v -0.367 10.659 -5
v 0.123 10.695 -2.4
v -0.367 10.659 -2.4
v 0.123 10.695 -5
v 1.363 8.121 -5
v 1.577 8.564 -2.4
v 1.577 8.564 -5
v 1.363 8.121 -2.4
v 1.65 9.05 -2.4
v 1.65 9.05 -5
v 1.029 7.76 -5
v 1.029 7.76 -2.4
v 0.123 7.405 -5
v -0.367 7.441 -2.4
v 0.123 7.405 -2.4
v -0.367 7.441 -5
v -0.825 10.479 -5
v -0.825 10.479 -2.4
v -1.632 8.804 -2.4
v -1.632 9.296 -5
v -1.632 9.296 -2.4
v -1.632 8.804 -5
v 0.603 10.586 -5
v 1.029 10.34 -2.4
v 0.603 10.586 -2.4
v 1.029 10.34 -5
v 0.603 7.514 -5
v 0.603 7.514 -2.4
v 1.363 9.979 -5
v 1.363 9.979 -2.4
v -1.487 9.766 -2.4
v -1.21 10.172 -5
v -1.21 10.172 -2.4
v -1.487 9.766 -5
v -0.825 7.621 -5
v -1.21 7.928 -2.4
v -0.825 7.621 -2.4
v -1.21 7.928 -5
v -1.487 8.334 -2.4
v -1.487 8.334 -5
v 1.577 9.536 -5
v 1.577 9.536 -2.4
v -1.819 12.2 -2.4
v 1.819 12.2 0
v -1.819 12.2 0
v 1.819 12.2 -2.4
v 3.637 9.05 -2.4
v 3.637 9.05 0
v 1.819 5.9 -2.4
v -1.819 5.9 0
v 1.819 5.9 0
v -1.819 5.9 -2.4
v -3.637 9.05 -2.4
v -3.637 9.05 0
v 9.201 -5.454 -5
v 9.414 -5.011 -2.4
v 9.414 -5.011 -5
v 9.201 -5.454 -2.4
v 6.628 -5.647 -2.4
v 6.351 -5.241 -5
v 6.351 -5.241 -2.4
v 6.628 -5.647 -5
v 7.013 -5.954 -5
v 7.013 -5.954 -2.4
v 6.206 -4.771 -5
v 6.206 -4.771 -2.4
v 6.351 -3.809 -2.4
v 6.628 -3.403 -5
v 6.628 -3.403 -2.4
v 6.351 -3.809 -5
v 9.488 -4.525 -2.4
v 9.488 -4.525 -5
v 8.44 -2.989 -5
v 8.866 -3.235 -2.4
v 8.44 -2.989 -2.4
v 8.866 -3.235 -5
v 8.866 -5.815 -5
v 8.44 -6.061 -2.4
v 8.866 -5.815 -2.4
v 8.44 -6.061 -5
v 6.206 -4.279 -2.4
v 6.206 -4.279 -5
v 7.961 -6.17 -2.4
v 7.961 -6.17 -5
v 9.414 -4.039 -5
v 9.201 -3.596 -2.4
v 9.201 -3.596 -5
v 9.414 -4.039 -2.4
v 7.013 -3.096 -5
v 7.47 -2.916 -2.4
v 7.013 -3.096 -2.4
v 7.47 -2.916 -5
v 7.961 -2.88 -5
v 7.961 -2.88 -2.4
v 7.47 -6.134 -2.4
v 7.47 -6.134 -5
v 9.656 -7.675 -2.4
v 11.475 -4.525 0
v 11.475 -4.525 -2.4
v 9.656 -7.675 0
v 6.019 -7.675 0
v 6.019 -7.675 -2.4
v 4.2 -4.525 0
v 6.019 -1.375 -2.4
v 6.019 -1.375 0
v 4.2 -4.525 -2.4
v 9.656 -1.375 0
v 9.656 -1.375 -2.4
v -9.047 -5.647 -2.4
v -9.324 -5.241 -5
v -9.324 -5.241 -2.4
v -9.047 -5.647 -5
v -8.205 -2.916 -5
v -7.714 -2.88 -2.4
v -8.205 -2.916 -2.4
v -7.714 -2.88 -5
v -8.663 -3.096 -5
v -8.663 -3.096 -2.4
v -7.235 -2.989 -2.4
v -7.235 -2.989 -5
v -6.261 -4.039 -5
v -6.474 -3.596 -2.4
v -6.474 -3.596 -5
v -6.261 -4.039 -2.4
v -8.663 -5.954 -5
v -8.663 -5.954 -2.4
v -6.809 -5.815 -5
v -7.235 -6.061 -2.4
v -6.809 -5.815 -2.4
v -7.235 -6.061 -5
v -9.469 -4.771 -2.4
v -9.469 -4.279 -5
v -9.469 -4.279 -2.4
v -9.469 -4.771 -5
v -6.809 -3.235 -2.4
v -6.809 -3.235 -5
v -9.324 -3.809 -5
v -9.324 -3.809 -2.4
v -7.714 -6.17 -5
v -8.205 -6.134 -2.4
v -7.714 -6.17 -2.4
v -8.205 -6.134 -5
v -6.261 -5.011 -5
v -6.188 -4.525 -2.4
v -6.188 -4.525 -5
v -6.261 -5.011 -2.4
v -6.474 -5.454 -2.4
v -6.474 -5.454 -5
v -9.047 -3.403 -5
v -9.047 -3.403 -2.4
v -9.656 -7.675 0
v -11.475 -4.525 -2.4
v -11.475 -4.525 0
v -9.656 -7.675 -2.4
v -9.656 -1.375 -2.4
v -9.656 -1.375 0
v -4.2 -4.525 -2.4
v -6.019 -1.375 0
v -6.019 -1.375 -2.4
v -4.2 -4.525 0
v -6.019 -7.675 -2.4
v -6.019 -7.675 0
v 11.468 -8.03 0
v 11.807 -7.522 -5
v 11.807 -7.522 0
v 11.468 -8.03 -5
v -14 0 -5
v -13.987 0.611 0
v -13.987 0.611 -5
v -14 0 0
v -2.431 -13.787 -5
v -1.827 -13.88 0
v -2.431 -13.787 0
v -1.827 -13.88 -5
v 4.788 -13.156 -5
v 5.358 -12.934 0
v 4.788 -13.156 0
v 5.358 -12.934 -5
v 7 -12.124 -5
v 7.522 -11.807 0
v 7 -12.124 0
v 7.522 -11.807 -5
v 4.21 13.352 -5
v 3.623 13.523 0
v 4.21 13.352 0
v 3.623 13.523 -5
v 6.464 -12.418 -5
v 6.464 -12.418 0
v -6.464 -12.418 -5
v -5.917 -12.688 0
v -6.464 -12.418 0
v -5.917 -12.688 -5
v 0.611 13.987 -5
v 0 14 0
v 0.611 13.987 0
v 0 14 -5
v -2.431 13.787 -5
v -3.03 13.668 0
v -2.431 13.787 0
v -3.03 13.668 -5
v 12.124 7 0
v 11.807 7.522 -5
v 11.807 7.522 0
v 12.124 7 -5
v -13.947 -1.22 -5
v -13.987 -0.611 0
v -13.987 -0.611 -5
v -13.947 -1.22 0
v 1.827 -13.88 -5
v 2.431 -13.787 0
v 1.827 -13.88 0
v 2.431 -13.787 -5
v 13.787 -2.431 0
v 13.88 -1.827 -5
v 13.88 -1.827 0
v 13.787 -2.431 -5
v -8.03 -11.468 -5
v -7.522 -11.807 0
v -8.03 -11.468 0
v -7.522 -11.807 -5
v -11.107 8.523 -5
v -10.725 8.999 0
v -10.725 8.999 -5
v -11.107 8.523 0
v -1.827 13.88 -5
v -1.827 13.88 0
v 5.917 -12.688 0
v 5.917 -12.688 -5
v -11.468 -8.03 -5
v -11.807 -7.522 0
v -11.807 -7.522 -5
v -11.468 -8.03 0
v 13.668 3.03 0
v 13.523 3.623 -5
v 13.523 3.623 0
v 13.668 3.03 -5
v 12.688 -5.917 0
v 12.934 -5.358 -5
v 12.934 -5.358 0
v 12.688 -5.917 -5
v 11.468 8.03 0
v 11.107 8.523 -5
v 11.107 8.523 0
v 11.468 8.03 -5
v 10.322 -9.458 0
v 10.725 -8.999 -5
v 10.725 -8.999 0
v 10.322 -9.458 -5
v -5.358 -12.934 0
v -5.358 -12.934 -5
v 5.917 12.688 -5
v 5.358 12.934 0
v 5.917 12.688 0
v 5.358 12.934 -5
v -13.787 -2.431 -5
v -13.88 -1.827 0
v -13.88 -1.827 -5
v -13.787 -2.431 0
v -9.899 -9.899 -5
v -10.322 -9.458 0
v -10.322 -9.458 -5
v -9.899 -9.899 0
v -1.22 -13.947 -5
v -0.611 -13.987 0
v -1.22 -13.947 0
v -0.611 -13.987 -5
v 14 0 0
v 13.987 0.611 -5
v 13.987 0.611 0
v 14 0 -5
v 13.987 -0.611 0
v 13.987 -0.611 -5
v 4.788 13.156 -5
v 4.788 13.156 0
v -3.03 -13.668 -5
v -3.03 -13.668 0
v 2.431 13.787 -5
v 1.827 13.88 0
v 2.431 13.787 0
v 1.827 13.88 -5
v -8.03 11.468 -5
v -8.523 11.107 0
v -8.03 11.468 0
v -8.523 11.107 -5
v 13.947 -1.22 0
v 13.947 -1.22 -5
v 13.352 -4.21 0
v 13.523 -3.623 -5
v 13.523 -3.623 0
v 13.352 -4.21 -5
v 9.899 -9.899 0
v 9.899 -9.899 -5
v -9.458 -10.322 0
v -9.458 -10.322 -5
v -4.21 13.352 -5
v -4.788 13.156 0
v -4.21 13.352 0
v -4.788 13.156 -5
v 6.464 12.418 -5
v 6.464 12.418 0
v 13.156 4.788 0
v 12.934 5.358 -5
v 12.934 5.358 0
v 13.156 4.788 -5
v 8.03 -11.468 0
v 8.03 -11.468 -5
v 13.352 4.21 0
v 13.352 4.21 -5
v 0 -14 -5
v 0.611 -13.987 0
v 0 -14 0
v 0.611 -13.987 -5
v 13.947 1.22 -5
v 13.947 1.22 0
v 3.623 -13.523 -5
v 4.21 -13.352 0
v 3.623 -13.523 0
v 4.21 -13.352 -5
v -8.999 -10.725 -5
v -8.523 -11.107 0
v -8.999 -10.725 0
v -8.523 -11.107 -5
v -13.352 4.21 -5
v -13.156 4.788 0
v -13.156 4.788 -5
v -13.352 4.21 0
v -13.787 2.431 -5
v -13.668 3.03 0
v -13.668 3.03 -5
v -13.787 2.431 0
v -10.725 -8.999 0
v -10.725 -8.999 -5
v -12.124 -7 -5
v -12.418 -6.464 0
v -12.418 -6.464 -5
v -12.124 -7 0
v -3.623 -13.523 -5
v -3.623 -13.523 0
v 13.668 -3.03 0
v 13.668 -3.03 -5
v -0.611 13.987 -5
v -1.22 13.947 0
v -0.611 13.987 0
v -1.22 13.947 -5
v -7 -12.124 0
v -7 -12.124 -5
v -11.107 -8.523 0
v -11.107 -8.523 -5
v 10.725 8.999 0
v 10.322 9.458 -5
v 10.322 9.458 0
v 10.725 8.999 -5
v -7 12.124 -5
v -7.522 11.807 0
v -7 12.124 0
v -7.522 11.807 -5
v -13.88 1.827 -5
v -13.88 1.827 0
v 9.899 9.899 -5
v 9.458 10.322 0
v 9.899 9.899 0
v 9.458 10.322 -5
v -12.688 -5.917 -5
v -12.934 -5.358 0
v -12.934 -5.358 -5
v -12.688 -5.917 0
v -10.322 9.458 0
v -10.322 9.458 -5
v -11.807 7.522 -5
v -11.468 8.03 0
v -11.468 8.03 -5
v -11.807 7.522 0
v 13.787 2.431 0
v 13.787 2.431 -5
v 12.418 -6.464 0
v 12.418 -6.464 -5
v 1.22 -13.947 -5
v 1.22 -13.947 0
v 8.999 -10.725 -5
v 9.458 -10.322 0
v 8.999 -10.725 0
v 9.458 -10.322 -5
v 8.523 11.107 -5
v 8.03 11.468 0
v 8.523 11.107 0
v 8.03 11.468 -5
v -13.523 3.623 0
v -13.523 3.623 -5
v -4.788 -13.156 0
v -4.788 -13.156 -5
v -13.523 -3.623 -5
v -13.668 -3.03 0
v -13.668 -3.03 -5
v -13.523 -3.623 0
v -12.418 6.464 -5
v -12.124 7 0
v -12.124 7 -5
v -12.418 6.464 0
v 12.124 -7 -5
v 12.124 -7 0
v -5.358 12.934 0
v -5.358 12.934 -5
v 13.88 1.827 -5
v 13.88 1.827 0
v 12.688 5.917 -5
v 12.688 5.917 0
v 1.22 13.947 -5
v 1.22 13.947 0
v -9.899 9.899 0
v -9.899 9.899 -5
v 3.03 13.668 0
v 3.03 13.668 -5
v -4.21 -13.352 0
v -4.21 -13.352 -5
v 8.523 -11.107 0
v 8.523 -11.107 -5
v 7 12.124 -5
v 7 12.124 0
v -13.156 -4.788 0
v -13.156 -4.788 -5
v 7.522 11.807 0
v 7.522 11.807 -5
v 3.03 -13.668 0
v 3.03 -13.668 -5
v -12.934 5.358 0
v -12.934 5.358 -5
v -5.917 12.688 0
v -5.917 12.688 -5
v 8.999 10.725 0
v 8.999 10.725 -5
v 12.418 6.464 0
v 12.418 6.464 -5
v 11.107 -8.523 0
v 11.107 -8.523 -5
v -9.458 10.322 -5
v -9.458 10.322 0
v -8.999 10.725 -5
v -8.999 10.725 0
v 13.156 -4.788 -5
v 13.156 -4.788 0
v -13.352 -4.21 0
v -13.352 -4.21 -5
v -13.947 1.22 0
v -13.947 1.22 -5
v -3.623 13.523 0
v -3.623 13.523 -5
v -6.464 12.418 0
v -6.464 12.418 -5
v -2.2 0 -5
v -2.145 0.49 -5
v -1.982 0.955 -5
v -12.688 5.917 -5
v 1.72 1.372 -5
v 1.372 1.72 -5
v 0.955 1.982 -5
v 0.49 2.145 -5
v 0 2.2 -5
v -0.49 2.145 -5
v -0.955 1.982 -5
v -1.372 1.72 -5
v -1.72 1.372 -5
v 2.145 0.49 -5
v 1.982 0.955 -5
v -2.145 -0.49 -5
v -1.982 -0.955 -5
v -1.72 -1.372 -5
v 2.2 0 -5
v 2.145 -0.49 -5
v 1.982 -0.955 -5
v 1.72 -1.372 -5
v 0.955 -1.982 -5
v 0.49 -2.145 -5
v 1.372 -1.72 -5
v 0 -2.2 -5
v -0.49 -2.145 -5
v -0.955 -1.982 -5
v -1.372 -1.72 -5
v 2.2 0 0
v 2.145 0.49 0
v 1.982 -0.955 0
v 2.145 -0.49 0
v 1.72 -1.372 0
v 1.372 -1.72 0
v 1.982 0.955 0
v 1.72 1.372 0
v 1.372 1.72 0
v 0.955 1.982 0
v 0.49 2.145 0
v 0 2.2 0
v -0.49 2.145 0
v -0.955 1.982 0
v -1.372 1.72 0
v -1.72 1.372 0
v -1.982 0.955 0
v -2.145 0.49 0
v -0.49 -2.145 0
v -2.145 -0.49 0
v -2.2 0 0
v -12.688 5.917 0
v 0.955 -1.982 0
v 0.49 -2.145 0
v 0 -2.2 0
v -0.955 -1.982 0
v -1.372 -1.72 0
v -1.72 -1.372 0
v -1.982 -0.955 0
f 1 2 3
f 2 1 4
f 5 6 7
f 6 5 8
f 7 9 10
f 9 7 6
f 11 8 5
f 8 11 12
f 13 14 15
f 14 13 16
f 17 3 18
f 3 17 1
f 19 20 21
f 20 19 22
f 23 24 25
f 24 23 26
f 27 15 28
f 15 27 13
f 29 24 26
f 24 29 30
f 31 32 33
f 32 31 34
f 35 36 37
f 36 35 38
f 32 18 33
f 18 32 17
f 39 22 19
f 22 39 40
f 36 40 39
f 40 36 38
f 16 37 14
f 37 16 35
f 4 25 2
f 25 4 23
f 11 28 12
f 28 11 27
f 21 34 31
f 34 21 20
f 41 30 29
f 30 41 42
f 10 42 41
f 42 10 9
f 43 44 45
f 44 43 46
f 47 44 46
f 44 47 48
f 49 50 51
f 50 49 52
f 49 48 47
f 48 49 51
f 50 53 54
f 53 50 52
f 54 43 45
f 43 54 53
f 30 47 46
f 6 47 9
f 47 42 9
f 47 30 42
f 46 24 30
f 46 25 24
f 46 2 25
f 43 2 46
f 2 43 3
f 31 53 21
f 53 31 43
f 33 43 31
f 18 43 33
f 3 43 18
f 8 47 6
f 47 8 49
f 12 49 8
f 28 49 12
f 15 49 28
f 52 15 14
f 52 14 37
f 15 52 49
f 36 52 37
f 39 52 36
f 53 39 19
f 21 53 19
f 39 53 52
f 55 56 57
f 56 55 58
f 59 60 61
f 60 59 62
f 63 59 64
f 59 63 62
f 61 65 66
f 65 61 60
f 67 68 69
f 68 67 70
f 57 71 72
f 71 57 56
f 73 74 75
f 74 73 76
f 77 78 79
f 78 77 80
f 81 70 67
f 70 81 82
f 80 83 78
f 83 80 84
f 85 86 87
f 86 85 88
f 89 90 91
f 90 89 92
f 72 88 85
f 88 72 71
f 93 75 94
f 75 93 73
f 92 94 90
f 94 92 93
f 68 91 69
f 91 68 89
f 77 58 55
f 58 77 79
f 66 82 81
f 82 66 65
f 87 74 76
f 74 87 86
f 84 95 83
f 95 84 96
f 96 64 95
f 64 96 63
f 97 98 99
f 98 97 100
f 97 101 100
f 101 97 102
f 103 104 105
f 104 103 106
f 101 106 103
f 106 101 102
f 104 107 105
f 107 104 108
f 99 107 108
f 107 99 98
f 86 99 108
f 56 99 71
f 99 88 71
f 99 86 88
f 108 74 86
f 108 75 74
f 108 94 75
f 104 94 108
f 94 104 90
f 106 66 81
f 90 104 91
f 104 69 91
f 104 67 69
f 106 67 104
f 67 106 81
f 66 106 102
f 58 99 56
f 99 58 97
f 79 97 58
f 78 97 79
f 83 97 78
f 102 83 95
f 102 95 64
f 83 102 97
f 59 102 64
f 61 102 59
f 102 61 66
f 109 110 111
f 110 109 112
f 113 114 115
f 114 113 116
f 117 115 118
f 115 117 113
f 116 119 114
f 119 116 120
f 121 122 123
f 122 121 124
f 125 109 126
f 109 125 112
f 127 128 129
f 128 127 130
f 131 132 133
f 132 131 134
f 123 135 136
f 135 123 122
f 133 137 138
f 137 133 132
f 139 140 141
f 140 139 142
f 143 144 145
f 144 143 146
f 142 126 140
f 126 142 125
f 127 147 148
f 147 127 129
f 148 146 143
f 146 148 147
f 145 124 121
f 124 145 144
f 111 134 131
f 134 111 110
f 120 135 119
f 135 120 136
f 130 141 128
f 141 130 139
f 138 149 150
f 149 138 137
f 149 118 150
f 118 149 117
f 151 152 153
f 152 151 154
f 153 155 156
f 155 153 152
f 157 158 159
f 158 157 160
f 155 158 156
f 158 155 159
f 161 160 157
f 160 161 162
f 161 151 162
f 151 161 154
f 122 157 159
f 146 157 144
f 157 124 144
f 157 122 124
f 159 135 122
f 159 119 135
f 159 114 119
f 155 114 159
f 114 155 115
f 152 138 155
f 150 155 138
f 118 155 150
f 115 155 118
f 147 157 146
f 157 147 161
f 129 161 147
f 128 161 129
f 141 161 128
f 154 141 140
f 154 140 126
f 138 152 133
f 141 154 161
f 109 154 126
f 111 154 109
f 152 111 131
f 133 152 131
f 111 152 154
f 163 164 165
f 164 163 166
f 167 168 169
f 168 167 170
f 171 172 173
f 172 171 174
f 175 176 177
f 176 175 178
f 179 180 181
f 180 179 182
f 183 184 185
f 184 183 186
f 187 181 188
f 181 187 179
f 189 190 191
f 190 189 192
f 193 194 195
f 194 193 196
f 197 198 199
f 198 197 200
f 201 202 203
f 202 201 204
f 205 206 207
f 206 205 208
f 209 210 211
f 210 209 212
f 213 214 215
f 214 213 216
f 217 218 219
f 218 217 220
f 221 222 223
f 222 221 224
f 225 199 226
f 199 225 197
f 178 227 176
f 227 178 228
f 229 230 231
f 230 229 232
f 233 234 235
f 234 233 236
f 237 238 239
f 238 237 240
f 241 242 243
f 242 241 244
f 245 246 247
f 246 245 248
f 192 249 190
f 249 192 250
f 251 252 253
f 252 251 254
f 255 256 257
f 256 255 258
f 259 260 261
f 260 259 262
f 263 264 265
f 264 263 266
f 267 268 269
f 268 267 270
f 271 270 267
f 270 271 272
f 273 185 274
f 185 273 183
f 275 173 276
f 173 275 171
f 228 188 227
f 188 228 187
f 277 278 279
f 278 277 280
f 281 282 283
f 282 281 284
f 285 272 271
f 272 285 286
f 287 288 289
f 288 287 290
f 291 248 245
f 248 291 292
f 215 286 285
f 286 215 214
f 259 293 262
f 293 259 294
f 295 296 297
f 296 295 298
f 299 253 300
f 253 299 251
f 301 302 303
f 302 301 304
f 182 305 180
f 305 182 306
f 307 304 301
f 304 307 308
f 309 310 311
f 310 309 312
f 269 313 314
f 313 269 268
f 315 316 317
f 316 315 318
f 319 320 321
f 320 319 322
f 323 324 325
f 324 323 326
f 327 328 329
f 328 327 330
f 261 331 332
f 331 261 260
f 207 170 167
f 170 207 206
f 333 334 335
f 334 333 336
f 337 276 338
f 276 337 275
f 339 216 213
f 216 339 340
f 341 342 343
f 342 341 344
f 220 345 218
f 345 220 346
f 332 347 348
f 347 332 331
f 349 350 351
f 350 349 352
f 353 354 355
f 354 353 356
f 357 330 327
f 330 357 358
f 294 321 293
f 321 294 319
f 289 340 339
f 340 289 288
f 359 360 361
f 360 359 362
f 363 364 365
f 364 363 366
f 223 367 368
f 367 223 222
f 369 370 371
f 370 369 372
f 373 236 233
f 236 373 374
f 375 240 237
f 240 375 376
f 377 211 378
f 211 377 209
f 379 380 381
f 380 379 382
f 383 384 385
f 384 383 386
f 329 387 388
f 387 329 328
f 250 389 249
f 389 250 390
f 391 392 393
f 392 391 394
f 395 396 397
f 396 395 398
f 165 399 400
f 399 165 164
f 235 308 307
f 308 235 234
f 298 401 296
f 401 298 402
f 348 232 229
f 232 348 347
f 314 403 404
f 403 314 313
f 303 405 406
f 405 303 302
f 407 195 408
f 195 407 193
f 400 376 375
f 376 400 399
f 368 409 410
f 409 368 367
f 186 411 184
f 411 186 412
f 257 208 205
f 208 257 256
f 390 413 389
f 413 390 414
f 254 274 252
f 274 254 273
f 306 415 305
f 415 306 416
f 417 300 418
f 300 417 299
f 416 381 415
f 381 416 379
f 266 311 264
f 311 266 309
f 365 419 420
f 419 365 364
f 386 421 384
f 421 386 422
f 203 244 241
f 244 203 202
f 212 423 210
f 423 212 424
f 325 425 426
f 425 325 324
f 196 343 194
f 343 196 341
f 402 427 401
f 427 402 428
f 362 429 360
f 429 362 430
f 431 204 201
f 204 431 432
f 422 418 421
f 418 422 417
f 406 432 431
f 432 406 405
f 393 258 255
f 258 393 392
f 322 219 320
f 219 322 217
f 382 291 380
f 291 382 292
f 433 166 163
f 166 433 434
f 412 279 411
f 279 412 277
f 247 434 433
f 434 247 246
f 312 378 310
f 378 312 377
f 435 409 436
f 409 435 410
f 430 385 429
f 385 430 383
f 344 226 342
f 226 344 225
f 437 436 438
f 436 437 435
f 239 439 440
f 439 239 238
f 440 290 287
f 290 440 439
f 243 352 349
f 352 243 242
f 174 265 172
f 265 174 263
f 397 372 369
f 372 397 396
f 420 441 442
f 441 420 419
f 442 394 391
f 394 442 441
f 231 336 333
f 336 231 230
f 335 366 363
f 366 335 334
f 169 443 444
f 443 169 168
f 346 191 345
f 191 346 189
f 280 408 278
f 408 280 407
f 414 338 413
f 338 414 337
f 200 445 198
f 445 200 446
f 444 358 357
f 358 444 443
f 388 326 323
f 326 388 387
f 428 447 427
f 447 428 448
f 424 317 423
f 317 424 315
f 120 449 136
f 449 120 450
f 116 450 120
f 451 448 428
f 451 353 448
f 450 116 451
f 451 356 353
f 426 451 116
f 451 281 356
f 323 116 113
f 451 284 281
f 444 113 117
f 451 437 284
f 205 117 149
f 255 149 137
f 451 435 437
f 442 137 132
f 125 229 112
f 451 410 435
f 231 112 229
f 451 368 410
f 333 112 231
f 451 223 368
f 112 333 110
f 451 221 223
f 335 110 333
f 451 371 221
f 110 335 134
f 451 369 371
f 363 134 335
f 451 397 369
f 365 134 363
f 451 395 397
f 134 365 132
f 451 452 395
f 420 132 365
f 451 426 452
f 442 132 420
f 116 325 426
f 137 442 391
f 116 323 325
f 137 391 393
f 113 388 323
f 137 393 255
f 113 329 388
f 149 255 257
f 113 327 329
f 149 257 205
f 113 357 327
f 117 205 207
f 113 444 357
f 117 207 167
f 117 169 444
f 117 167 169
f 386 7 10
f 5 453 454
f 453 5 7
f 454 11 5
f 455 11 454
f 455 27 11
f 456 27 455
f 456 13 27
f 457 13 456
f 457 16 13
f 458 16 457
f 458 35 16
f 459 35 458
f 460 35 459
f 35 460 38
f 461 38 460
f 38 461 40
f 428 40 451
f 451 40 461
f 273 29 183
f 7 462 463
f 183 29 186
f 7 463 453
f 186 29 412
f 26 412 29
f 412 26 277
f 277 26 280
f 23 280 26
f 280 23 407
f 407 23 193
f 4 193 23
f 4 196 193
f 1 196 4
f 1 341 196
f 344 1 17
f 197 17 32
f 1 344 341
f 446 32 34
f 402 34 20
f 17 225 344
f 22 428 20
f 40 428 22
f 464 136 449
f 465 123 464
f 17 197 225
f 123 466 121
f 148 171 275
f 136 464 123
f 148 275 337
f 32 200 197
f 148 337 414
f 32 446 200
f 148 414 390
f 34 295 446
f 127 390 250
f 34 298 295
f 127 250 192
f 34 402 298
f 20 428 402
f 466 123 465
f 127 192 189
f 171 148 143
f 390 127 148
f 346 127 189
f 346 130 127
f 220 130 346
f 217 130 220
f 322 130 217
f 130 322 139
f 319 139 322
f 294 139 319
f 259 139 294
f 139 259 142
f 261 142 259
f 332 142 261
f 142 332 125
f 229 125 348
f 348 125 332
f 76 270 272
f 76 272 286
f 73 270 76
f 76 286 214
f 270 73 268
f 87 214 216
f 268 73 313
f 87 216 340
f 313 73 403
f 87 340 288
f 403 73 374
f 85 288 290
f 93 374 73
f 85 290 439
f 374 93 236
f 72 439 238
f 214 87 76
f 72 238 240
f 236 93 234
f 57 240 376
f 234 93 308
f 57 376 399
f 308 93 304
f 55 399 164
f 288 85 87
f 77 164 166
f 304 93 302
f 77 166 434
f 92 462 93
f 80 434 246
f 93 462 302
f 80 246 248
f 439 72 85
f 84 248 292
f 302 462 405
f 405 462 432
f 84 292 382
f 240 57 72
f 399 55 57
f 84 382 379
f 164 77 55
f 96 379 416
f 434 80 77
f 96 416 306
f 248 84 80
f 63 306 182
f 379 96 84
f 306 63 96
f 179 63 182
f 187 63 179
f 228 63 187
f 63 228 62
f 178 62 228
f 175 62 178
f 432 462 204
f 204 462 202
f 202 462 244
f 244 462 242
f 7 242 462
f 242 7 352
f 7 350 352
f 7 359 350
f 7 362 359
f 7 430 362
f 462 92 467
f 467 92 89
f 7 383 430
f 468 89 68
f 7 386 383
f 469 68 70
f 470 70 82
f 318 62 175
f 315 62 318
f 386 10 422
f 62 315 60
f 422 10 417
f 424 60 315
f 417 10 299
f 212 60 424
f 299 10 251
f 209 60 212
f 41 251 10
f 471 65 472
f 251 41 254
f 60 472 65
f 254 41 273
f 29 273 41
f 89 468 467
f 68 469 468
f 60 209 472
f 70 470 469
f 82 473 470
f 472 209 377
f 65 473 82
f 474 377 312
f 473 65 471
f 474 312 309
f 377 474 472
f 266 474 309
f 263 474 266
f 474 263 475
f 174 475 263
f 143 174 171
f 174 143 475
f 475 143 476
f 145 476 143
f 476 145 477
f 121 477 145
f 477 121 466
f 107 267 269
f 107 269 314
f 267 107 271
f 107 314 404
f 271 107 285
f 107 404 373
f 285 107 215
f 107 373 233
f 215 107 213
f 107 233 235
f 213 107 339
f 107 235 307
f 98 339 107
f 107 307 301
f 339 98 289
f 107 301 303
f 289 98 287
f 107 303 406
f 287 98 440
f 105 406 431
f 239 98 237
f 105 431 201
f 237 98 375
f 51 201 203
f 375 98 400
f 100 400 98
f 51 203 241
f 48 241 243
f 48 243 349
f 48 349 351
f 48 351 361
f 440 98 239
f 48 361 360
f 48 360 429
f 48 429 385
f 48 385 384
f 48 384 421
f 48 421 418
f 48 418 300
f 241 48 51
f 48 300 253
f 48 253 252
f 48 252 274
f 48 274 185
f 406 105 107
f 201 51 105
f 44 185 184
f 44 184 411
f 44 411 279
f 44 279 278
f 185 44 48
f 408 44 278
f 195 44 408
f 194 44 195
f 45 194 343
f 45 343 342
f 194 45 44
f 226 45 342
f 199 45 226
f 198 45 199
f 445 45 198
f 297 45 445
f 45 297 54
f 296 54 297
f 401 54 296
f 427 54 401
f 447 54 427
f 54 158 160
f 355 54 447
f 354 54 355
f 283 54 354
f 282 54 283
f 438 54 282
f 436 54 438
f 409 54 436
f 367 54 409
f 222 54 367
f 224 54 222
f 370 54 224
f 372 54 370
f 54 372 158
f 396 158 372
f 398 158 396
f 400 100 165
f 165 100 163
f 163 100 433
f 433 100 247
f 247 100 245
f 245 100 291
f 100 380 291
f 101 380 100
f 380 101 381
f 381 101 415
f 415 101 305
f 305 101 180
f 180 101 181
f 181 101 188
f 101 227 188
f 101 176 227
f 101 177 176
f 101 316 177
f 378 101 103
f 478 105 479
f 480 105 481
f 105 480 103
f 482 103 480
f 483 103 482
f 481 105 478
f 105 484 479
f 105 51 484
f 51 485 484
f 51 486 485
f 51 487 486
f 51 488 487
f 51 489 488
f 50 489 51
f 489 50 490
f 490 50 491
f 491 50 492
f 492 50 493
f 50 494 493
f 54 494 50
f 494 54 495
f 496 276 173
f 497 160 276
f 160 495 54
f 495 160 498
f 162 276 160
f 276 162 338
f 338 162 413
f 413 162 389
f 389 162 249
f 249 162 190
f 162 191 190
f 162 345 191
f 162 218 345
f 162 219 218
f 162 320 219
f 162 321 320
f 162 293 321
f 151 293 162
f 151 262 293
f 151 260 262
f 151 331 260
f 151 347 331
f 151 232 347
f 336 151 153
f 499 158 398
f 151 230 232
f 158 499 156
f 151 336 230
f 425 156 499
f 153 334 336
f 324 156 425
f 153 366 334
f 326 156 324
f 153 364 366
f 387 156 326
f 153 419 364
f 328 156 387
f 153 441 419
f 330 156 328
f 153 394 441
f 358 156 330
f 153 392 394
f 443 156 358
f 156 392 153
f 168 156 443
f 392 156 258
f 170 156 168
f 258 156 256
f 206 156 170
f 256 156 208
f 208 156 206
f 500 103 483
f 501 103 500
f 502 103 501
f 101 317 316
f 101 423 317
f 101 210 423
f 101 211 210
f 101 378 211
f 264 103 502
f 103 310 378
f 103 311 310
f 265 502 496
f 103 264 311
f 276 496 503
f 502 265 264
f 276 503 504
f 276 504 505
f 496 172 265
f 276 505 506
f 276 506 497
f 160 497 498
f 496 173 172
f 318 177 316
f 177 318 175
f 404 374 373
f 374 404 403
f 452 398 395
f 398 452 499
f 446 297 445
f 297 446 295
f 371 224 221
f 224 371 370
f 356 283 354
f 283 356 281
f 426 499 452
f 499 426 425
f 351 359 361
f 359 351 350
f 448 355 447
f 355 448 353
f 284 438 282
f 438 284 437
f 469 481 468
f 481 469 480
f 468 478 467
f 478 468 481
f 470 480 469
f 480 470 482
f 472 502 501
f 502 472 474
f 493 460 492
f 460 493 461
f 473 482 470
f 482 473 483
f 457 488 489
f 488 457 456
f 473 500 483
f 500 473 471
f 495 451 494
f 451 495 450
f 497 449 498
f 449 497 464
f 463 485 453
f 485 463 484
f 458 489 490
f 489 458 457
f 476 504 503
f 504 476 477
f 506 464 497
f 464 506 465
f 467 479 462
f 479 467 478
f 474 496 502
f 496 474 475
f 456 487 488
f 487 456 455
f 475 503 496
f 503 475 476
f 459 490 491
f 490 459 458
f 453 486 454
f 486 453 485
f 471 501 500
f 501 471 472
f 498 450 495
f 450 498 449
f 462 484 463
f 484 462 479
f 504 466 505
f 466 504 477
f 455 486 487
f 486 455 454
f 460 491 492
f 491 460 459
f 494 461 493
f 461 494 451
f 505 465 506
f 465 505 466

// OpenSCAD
include <FullAssembly.scad>
/* [Hidden] */
isStandalone=false;

// Tiltplate/Spider
rotate([180,0,0]) tiltplate(dia, toffset, cut, ball, adjustbolt, centralbolt);
